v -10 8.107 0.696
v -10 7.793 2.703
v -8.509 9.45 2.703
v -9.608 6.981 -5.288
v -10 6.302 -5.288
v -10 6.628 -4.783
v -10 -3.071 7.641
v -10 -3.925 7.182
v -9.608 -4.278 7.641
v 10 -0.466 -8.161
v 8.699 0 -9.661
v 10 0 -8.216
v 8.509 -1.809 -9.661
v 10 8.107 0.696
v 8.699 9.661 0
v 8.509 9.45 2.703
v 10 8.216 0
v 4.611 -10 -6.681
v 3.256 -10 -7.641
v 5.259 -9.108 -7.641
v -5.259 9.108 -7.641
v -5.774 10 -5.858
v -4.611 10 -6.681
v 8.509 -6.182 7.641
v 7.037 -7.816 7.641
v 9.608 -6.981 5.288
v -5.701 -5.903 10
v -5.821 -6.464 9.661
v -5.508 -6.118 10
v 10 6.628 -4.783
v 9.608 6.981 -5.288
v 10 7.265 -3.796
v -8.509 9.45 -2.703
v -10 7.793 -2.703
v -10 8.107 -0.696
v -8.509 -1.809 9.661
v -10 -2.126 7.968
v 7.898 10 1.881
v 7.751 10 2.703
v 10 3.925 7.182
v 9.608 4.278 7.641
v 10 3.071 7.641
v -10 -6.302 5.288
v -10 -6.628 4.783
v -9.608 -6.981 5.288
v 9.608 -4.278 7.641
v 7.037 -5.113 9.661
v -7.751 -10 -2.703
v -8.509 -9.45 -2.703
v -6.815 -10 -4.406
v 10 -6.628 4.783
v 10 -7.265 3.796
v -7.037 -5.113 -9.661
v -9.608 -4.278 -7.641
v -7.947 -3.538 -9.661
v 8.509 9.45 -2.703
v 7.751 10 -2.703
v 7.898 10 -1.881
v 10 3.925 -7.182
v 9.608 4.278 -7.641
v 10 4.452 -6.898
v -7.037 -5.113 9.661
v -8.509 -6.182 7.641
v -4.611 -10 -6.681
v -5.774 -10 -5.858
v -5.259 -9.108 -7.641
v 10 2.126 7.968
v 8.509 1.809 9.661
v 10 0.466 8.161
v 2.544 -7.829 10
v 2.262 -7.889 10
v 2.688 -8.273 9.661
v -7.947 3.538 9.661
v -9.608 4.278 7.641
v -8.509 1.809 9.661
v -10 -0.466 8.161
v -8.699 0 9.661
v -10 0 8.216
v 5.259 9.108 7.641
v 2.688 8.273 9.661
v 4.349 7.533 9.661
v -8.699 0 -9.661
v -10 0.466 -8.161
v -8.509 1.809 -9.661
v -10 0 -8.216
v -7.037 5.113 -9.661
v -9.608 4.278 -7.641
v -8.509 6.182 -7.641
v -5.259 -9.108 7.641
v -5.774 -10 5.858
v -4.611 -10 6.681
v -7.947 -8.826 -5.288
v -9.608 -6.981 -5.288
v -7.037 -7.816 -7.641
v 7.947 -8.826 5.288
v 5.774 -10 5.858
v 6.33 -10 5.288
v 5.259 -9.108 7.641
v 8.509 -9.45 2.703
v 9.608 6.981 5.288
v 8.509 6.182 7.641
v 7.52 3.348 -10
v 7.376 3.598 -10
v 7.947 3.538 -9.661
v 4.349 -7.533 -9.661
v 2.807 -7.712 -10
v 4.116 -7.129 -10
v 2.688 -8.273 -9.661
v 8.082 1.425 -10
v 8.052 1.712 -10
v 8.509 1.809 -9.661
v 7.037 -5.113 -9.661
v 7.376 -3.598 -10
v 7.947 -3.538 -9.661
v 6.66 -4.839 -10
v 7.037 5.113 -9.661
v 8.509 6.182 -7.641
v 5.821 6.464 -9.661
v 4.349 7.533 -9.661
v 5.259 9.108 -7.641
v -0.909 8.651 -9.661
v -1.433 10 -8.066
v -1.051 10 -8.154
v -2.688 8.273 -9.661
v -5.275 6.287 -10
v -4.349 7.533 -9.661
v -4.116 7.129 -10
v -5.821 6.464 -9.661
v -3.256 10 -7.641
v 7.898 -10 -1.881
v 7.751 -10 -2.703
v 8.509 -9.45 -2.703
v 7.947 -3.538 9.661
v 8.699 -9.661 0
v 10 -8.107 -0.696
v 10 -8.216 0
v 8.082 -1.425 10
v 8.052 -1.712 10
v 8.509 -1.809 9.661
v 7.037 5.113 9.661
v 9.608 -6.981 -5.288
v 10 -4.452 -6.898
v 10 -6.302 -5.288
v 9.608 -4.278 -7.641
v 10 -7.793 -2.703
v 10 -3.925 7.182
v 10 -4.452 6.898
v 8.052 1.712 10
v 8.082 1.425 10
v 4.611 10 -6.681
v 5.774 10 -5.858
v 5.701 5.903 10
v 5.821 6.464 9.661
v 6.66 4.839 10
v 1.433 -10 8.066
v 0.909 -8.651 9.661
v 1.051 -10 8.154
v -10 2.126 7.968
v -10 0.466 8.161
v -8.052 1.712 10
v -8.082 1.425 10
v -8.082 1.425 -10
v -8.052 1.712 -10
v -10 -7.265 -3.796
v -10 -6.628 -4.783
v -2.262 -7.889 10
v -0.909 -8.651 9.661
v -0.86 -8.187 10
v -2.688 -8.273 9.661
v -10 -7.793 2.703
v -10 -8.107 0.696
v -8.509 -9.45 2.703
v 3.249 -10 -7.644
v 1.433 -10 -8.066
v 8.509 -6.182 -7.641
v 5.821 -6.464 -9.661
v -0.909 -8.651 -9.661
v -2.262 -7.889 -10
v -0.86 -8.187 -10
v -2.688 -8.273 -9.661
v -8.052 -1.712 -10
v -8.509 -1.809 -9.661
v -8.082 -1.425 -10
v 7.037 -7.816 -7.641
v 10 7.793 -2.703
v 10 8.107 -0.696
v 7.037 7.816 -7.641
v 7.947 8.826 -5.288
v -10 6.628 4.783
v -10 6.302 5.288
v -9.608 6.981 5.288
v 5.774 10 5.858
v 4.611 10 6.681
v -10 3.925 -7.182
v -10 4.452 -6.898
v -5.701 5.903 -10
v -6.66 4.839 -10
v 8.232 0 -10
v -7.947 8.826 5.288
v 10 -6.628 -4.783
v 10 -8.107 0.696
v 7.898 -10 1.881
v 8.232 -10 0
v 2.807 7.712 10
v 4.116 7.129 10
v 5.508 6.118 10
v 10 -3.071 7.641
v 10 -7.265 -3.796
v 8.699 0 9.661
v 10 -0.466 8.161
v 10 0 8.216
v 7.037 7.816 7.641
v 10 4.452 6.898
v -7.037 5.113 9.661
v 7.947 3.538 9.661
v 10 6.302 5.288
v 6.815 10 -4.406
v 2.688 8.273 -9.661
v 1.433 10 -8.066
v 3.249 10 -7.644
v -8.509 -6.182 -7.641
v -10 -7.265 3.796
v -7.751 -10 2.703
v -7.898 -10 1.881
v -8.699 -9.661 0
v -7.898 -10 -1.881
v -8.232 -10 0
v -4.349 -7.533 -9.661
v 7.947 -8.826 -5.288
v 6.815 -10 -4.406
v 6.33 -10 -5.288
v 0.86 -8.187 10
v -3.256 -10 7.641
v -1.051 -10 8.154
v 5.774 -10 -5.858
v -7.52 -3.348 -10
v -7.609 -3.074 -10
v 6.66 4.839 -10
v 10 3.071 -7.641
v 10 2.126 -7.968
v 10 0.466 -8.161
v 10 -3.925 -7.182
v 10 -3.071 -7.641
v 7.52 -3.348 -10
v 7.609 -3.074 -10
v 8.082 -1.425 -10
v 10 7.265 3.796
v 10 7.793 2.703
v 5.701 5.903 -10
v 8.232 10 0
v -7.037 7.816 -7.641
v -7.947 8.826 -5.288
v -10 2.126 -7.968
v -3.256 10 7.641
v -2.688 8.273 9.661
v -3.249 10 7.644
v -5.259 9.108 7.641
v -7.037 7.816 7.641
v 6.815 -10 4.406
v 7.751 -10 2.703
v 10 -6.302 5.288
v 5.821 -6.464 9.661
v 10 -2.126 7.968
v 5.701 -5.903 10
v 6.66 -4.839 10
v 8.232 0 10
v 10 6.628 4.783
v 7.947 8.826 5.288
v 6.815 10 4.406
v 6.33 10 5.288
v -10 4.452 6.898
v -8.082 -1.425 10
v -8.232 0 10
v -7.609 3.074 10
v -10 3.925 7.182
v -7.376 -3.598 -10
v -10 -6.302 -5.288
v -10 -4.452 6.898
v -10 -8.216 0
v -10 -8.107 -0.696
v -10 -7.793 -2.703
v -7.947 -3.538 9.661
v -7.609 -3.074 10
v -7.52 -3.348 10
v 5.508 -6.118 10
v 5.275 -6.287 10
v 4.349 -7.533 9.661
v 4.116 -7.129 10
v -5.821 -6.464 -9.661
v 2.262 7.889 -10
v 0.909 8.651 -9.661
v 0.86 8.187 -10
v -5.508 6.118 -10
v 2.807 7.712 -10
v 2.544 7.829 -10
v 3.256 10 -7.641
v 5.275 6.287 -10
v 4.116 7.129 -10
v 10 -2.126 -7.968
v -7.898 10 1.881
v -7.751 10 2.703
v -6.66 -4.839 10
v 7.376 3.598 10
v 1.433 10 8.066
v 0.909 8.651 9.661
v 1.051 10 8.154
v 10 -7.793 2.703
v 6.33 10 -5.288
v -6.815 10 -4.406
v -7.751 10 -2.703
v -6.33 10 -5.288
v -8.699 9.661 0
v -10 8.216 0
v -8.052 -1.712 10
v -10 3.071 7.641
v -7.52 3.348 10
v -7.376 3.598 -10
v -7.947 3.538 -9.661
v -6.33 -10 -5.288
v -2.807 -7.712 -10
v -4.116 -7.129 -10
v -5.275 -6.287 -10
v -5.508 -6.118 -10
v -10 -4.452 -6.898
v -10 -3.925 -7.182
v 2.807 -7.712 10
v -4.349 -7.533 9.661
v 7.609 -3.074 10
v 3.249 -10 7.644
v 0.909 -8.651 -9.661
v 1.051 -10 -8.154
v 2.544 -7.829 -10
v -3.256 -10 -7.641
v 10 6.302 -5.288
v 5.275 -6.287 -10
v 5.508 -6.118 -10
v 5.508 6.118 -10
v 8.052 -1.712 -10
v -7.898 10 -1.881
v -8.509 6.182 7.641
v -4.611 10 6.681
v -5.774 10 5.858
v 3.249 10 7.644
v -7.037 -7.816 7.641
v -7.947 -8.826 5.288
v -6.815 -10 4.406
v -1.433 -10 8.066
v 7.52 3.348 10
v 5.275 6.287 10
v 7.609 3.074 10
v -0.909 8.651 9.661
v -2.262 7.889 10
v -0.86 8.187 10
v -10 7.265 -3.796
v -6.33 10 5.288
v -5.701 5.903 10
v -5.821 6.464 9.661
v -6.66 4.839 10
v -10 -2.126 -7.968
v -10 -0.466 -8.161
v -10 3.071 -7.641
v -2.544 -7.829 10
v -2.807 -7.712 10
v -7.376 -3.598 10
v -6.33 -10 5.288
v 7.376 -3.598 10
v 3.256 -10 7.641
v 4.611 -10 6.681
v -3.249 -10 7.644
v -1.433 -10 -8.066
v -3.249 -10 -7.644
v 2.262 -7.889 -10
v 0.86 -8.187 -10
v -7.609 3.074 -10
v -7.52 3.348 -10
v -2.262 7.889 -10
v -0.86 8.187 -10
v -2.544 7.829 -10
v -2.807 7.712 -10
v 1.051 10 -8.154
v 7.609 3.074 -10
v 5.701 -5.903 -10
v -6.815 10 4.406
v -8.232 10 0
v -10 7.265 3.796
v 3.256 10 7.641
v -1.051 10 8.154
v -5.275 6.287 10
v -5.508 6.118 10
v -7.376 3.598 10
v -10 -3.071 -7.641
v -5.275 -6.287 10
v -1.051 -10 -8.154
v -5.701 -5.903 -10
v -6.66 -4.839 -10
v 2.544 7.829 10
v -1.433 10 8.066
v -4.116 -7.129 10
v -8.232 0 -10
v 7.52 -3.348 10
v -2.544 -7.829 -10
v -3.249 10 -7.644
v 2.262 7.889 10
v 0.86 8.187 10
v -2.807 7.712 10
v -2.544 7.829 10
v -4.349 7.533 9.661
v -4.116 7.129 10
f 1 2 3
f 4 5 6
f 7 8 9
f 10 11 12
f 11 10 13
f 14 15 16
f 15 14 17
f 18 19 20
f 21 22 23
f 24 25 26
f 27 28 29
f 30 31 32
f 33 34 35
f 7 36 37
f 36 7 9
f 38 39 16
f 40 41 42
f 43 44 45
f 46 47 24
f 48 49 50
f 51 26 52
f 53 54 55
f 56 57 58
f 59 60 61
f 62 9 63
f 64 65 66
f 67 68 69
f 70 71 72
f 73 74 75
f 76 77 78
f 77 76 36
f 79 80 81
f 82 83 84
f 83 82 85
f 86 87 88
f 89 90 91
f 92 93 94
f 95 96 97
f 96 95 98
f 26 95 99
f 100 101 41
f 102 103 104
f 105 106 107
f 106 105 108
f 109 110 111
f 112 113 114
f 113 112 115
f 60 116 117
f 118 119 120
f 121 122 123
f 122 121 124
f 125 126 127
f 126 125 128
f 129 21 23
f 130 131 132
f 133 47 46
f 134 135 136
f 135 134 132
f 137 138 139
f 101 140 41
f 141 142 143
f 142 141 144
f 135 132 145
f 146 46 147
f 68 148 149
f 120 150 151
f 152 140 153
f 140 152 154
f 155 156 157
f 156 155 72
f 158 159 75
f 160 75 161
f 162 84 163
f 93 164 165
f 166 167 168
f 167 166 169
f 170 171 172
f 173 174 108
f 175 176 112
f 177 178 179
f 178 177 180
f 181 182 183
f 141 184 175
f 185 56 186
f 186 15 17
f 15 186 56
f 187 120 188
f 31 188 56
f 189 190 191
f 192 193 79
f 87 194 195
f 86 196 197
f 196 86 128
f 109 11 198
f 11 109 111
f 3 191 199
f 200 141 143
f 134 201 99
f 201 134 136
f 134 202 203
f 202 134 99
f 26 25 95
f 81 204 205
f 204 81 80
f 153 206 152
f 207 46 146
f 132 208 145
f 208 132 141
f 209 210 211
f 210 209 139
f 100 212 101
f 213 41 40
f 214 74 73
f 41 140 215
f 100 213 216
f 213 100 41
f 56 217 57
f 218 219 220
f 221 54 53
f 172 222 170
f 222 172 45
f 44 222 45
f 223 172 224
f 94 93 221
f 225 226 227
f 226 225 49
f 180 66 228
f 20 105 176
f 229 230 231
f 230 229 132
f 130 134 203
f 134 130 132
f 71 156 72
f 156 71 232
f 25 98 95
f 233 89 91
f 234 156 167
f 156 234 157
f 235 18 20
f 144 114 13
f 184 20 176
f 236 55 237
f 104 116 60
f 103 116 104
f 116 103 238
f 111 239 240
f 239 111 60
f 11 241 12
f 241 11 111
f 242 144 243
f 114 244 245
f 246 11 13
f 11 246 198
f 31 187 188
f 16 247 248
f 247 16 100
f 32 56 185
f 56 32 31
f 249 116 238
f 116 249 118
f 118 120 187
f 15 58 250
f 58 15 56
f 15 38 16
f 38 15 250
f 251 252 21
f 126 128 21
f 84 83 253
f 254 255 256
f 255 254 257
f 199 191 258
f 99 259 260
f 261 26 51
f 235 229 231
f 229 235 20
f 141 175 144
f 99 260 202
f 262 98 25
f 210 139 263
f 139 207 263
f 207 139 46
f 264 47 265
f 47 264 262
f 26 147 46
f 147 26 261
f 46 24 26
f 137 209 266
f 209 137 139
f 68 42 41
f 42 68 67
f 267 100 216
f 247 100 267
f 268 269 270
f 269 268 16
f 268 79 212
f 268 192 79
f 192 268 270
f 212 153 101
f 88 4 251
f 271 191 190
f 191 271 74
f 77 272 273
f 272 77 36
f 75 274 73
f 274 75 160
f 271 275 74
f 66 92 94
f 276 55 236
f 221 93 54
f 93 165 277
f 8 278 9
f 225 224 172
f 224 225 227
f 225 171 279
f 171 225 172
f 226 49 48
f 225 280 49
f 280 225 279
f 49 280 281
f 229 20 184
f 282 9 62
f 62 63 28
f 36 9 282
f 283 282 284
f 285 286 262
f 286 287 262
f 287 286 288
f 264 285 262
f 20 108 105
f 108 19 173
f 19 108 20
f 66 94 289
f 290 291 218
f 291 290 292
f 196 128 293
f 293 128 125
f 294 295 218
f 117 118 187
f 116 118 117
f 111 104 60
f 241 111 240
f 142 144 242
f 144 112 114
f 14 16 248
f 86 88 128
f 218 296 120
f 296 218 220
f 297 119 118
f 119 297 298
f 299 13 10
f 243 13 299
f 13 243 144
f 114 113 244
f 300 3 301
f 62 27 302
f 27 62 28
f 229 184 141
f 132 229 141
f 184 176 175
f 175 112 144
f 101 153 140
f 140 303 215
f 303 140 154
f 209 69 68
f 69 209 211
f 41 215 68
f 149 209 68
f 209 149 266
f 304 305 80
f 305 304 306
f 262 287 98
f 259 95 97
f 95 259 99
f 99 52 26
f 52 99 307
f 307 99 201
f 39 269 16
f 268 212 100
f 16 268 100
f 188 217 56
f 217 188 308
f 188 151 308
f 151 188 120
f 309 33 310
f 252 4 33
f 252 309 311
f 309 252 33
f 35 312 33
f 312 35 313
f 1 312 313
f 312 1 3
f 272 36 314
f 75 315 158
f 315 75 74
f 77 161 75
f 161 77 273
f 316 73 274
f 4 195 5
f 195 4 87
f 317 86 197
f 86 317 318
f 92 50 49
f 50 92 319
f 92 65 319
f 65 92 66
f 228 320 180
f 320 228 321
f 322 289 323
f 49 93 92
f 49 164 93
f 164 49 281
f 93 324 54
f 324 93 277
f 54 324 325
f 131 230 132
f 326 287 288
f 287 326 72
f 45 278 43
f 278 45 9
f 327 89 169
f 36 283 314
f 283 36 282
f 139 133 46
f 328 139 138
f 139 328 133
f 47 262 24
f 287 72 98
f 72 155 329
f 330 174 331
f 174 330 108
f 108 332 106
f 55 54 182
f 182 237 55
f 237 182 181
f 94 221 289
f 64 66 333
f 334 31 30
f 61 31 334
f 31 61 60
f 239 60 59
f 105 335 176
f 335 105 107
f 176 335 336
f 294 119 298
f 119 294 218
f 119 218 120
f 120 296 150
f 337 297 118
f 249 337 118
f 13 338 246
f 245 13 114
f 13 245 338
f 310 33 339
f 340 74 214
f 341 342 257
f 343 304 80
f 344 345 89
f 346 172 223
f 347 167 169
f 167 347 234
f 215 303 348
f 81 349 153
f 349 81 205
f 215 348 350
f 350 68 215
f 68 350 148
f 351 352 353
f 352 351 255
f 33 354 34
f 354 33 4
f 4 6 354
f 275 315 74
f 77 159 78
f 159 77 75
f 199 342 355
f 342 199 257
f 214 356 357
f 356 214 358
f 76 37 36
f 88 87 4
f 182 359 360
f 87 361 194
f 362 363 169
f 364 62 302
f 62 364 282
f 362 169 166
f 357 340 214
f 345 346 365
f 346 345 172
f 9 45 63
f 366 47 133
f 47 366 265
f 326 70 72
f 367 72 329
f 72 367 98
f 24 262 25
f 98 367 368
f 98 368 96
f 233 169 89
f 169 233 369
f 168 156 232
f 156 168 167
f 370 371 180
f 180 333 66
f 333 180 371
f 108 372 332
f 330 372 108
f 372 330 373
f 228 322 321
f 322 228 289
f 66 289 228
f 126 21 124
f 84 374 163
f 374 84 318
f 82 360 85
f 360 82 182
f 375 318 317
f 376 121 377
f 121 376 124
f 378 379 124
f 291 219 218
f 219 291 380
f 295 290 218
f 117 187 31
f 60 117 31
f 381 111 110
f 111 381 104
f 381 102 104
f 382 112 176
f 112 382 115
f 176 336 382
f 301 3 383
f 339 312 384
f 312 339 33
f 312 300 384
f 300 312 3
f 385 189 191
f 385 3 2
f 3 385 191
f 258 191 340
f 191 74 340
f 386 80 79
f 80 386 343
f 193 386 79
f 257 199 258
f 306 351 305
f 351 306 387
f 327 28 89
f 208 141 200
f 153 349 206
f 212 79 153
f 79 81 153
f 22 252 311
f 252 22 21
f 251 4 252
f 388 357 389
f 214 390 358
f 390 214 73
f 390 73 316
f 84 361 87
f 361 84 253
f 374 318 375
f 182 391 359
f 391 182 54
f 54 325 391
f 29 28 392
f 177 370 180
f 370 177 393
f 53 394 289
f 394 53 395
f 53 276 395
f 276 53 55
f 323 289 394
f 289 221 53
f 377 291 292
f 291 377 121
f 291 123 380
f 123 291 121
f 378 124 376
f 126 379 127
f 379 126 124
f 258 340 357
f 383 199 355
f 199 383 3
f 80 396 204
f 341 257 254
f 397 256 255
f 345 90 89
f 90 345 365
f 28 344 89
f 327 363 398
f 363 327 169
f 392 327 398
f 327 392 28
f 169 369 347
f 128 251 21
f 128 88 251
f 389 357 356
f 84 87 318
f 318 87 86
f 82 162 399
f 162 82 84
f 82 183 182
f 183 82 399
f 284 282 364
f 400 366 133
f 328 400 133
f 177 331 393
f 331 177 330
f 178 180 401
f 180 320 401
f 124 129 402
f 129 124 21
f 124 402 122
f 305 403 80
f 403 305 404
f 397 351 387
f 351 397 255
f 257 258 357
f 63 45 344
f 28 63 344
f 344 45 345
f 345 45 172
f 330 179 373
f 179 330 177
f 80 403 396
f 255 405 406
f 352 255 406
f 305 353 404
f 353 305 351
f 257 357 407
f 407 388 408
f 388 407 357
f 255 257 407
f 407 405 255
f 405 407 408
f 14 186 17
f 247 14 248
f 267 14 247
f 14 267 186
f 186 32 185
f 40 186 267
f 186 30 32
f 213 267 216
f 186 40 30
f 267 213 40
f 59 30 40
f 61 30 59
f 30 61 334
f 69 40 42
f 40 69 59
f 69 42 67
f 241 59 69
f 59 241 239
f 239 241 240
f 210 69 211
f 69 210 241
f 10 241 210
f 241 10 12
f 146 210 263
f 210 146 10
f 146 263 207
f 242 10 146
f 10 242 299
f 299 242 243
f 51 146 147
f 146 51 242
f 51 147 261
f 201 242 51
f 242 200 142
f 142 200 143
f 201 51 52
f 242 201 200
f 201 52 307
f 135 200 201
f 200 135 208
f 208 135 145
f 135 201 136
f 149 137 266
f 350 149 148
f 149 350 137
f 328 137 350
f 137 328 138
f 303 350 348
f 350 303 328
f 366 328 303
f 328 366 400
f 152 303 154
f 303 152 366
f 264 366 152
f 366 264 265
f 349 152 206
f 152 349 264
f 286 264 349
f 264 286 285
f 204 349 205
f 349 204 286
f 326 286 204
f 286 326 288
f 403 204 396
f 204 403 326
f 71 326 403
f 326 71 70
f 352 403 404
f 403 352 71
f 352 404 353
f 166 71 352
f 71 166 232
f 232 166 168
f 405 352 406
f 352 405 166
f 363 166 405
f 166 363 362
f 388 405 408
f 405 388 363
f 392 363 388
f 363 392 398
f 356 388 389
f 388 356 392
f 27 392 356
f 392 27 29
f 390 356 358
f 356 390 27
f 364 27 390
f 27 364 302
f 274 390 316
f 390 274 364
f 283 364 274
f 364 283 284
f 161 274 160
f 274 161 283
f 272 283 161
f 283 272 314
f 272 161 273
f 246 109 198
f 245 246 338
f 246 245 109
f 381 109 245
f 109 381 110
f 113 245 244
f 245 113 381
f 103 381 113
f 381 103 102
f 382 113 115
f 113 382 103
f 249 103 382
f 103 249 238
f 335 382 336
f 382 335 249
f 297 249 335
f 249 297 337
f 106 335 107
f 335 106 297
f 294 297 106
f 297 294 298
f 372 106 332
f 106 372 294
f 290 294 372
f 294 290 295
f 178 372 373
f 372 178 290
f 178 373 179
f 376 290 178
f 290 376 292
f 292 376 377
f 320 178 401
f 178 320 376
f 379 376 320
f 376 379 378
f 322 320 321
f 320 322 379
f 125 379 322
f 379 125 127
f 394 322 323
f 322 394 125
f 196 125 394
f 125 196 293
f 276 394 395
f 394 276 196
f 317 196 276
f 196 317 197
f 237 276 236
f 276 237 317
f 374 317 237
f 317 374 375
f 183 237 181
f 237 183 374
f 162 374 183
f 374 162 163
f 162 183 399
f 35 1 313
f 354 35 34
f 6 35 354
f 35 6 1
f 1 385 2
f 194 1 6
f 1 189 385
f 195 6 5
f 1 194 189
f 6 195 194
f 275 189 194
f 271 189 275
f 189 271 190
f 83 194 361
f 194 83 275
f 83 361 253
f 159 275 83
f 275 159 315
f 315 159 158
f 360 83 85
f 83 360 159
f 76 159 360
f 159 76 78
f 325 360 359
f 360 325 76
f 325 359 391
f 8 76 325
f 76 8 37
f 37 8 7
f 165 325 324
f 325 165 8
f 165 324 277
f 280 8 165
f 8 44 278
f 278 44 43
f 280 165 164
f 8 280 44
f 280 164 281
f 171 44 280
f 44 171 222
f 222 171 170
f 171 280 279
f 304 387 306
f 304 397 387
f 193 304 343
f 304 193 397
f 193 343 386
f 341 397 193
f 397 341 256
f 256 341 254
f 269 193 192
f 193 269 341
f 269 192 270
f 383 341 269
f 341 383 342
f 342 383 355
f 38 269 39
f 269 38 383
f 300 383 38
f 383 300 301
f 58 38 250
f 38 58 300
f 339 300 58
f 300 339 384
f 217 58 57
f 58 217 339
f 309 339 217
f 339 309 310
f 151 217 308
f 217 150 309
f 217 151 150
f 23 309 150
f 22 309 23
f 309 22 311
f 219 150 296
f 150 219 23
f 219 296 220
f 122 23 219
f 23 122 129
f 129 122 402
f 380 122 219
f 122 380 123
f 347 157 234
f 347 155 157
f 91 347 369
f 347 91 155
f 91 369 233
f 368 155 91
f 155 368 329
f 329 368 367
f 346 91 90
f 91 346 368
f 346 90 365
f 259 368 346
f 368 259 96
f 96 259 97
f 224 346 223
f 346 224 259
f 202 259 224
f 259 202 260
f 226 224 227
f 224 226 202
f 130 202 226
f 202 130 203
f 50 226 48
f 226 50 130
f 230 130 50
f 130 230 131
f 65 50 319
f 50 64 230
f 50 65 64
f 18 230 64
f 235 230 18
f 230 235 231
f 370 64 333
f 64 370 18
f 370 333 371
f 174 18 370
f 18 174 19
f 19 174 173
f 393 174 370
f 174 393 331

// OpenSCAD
module test004b()
{
    difference ()
    {
        cube (20, center = true);
        difference ()
        {
            cube (40, center = true);
            sphere (13);
        }
    }
}

test004b();
